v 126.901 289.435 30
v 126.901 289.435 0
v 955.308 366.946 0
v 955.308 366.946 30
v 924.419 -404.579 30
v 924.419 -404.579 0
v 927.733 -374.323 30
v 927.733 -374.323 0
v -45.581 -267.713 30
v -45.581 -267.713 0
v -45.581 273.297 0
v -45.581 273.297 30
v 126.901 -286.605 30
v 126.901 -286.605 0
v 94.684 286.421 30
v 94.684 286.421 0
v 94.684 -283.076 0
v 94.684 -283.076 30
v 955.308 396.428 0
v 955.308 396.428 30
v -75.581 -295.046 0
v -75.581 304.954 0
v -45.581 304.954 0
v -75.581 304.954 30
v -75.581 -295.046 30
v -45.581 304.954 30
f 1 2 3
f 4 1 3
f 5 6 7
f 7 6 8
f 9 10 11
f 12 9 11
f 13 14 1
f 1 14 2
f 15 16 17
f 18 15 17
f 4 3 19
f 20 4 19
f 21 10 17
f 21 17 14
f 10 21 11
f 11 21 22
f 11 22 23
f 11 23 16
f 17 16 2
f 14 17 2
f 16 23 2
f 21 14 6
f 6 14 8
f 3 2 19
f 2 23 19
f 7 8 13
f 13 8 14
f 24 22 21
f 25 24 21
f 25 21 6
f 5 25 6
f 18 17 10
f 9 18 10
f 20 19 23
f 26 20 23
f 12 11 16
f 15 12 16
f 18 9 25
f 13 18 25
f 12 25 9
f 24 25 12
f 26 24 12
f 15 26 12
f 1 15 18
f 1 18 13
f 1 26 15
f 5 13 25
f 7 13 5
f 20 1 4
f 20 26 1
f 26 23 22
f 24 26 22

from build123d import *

# Parameters (mm, degrees)
F1_DEPTH = 30


with BuildPart() as f1:
    # F0 (on Top) → F1 (new body)
    with BuildSketch(Plane.XY):
        Polygon((-45.581206, 304.954057), (-75.581206, 304.954057), (-75.581206, -295.045943), (-45.581206, -295.045943), (-45.581206, -267.712643), (-45.581206, 273.296505), align=None)
        Polygon((-45.581206, -295.045943), (-75.581206, -295.045943), (924.418794, -404.579163), (927.732864, -374.322866), (126.900651, -286.605136), (94.68448, -283.076395), (-45.581206, -267.712643), align=None)
        Polygon((126.900651, 289.434935), (94.68448, 286.420598), (94.68448, -283.076395), (126.900651, -286.605136), align=None)
        Polygon((955.307603, 396.427751), (-45.581206, 304.954057), (-45.581206, 273.296505), (94.68448, 286.420598), (126.900651, 289.434935), (955.307603, 366.945624), align=None)
    extrude(amount=F1_DEPTH)


solid = f1.part
